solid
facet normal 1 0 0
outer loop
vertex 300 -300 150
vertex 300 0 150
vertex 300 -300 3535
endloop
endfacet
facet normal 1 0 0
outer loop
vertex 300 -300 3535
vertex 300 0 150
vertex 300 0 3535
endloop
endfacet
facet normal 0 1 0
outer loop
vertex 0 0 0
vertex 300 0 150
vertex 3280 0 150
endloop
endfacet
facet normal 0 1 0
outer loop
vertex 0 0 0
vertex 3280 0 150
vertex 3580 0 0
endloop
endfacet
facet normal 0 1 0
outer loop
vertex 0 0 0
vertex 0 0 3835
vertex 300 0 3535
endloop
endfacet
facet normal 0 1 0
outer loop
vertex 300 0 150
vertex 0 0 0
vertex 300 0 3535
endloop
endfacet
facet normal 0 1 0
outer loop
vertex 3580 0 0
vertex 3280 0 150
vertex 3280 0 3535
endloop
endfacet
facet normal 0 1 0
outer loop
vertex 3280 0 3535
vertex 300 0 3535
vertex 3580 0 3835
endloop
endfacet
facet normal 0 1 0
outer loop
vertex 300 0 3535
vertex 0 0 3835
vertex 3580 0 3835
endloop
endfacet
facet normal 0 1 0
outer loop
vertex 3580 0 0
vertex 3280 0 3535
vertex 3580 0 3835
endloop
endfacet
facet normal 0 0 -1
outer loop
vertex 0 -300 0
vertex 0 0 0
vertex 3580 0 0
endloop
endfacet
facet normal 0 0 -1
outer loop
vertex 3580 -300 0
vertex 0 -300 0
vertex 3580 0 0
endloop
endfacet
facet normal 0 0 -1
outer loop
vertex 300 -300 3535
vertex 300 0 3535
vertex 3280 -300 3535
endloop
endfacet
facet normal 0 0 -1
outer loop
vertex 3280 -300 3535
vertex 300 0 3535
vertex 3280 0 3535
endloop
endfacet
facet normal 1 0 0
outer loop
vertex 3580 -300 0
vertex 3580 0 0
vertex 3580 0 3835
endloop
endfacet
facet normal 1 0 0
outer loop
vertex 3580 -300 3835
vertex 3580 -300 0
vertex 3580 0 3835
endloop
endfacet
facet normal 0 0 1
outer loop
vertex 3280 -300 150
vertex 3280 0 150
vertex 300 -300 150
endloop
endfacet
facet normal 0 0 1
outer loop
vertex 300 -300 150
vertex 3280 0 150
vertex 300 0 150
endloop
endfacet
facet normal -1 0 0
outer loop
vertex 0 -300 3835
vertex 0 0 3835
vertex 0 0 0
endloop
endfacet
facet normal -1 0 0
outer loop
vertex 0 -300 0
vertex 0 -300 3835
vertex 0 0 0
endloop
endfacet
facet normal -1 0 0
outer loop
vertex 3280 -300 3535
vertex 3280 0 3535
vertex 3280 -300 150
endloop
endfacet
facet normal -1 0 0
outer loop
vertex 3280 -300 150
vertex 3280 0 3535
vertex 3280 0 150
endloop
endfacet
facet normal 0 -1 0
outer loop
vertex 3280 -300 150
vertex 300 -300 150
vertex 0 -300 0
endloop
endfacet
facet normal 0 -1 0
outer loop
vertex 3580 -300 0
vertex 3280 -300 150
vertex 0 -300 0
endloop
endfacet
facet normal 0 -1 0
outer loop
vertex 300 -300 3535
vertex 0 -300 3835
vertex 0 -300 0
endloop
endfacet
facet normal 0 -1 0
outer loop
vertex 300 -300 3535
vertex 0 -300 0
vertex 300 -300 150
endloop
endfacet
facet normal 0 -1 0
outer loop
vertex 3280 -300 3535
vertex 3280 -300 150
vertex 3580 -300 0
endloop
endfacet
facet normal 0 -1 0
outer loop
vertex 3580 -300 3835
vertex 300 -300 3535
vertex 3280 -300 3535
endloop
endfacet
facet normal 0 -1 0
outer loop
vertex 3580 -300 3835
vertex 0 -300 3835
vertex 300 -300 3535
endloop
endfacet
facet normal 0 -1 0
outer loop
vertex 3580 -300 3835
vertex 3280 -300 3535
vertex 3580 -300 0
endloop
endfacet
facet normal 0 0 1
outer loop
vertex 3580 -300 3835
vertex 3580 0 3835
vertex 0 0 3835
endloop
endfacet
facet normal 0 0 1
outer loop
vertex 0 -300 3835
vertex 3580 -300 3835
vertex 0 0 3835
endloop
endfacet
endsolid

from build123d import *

# Parameters (mm, degrees)
F1_DEPTH = 300


with BuildPart() as f1:
    # F0 (on Front) → F1 (new body)
    with BuildSketch(Plane.XZ):
        Polygon((300, 150), (300, 3535), (3280, 3535), (3280, 150), (3580, 150), (3580, 3835), (0, 3835), (0, 150), align=None)
        Polygon((3280, 150), (300, 150), (0, 150), (0, 0), (3580, 0), (3580, 150), align=None)
    extrude(amount=F1_DEPTH)


solid = f1.part
